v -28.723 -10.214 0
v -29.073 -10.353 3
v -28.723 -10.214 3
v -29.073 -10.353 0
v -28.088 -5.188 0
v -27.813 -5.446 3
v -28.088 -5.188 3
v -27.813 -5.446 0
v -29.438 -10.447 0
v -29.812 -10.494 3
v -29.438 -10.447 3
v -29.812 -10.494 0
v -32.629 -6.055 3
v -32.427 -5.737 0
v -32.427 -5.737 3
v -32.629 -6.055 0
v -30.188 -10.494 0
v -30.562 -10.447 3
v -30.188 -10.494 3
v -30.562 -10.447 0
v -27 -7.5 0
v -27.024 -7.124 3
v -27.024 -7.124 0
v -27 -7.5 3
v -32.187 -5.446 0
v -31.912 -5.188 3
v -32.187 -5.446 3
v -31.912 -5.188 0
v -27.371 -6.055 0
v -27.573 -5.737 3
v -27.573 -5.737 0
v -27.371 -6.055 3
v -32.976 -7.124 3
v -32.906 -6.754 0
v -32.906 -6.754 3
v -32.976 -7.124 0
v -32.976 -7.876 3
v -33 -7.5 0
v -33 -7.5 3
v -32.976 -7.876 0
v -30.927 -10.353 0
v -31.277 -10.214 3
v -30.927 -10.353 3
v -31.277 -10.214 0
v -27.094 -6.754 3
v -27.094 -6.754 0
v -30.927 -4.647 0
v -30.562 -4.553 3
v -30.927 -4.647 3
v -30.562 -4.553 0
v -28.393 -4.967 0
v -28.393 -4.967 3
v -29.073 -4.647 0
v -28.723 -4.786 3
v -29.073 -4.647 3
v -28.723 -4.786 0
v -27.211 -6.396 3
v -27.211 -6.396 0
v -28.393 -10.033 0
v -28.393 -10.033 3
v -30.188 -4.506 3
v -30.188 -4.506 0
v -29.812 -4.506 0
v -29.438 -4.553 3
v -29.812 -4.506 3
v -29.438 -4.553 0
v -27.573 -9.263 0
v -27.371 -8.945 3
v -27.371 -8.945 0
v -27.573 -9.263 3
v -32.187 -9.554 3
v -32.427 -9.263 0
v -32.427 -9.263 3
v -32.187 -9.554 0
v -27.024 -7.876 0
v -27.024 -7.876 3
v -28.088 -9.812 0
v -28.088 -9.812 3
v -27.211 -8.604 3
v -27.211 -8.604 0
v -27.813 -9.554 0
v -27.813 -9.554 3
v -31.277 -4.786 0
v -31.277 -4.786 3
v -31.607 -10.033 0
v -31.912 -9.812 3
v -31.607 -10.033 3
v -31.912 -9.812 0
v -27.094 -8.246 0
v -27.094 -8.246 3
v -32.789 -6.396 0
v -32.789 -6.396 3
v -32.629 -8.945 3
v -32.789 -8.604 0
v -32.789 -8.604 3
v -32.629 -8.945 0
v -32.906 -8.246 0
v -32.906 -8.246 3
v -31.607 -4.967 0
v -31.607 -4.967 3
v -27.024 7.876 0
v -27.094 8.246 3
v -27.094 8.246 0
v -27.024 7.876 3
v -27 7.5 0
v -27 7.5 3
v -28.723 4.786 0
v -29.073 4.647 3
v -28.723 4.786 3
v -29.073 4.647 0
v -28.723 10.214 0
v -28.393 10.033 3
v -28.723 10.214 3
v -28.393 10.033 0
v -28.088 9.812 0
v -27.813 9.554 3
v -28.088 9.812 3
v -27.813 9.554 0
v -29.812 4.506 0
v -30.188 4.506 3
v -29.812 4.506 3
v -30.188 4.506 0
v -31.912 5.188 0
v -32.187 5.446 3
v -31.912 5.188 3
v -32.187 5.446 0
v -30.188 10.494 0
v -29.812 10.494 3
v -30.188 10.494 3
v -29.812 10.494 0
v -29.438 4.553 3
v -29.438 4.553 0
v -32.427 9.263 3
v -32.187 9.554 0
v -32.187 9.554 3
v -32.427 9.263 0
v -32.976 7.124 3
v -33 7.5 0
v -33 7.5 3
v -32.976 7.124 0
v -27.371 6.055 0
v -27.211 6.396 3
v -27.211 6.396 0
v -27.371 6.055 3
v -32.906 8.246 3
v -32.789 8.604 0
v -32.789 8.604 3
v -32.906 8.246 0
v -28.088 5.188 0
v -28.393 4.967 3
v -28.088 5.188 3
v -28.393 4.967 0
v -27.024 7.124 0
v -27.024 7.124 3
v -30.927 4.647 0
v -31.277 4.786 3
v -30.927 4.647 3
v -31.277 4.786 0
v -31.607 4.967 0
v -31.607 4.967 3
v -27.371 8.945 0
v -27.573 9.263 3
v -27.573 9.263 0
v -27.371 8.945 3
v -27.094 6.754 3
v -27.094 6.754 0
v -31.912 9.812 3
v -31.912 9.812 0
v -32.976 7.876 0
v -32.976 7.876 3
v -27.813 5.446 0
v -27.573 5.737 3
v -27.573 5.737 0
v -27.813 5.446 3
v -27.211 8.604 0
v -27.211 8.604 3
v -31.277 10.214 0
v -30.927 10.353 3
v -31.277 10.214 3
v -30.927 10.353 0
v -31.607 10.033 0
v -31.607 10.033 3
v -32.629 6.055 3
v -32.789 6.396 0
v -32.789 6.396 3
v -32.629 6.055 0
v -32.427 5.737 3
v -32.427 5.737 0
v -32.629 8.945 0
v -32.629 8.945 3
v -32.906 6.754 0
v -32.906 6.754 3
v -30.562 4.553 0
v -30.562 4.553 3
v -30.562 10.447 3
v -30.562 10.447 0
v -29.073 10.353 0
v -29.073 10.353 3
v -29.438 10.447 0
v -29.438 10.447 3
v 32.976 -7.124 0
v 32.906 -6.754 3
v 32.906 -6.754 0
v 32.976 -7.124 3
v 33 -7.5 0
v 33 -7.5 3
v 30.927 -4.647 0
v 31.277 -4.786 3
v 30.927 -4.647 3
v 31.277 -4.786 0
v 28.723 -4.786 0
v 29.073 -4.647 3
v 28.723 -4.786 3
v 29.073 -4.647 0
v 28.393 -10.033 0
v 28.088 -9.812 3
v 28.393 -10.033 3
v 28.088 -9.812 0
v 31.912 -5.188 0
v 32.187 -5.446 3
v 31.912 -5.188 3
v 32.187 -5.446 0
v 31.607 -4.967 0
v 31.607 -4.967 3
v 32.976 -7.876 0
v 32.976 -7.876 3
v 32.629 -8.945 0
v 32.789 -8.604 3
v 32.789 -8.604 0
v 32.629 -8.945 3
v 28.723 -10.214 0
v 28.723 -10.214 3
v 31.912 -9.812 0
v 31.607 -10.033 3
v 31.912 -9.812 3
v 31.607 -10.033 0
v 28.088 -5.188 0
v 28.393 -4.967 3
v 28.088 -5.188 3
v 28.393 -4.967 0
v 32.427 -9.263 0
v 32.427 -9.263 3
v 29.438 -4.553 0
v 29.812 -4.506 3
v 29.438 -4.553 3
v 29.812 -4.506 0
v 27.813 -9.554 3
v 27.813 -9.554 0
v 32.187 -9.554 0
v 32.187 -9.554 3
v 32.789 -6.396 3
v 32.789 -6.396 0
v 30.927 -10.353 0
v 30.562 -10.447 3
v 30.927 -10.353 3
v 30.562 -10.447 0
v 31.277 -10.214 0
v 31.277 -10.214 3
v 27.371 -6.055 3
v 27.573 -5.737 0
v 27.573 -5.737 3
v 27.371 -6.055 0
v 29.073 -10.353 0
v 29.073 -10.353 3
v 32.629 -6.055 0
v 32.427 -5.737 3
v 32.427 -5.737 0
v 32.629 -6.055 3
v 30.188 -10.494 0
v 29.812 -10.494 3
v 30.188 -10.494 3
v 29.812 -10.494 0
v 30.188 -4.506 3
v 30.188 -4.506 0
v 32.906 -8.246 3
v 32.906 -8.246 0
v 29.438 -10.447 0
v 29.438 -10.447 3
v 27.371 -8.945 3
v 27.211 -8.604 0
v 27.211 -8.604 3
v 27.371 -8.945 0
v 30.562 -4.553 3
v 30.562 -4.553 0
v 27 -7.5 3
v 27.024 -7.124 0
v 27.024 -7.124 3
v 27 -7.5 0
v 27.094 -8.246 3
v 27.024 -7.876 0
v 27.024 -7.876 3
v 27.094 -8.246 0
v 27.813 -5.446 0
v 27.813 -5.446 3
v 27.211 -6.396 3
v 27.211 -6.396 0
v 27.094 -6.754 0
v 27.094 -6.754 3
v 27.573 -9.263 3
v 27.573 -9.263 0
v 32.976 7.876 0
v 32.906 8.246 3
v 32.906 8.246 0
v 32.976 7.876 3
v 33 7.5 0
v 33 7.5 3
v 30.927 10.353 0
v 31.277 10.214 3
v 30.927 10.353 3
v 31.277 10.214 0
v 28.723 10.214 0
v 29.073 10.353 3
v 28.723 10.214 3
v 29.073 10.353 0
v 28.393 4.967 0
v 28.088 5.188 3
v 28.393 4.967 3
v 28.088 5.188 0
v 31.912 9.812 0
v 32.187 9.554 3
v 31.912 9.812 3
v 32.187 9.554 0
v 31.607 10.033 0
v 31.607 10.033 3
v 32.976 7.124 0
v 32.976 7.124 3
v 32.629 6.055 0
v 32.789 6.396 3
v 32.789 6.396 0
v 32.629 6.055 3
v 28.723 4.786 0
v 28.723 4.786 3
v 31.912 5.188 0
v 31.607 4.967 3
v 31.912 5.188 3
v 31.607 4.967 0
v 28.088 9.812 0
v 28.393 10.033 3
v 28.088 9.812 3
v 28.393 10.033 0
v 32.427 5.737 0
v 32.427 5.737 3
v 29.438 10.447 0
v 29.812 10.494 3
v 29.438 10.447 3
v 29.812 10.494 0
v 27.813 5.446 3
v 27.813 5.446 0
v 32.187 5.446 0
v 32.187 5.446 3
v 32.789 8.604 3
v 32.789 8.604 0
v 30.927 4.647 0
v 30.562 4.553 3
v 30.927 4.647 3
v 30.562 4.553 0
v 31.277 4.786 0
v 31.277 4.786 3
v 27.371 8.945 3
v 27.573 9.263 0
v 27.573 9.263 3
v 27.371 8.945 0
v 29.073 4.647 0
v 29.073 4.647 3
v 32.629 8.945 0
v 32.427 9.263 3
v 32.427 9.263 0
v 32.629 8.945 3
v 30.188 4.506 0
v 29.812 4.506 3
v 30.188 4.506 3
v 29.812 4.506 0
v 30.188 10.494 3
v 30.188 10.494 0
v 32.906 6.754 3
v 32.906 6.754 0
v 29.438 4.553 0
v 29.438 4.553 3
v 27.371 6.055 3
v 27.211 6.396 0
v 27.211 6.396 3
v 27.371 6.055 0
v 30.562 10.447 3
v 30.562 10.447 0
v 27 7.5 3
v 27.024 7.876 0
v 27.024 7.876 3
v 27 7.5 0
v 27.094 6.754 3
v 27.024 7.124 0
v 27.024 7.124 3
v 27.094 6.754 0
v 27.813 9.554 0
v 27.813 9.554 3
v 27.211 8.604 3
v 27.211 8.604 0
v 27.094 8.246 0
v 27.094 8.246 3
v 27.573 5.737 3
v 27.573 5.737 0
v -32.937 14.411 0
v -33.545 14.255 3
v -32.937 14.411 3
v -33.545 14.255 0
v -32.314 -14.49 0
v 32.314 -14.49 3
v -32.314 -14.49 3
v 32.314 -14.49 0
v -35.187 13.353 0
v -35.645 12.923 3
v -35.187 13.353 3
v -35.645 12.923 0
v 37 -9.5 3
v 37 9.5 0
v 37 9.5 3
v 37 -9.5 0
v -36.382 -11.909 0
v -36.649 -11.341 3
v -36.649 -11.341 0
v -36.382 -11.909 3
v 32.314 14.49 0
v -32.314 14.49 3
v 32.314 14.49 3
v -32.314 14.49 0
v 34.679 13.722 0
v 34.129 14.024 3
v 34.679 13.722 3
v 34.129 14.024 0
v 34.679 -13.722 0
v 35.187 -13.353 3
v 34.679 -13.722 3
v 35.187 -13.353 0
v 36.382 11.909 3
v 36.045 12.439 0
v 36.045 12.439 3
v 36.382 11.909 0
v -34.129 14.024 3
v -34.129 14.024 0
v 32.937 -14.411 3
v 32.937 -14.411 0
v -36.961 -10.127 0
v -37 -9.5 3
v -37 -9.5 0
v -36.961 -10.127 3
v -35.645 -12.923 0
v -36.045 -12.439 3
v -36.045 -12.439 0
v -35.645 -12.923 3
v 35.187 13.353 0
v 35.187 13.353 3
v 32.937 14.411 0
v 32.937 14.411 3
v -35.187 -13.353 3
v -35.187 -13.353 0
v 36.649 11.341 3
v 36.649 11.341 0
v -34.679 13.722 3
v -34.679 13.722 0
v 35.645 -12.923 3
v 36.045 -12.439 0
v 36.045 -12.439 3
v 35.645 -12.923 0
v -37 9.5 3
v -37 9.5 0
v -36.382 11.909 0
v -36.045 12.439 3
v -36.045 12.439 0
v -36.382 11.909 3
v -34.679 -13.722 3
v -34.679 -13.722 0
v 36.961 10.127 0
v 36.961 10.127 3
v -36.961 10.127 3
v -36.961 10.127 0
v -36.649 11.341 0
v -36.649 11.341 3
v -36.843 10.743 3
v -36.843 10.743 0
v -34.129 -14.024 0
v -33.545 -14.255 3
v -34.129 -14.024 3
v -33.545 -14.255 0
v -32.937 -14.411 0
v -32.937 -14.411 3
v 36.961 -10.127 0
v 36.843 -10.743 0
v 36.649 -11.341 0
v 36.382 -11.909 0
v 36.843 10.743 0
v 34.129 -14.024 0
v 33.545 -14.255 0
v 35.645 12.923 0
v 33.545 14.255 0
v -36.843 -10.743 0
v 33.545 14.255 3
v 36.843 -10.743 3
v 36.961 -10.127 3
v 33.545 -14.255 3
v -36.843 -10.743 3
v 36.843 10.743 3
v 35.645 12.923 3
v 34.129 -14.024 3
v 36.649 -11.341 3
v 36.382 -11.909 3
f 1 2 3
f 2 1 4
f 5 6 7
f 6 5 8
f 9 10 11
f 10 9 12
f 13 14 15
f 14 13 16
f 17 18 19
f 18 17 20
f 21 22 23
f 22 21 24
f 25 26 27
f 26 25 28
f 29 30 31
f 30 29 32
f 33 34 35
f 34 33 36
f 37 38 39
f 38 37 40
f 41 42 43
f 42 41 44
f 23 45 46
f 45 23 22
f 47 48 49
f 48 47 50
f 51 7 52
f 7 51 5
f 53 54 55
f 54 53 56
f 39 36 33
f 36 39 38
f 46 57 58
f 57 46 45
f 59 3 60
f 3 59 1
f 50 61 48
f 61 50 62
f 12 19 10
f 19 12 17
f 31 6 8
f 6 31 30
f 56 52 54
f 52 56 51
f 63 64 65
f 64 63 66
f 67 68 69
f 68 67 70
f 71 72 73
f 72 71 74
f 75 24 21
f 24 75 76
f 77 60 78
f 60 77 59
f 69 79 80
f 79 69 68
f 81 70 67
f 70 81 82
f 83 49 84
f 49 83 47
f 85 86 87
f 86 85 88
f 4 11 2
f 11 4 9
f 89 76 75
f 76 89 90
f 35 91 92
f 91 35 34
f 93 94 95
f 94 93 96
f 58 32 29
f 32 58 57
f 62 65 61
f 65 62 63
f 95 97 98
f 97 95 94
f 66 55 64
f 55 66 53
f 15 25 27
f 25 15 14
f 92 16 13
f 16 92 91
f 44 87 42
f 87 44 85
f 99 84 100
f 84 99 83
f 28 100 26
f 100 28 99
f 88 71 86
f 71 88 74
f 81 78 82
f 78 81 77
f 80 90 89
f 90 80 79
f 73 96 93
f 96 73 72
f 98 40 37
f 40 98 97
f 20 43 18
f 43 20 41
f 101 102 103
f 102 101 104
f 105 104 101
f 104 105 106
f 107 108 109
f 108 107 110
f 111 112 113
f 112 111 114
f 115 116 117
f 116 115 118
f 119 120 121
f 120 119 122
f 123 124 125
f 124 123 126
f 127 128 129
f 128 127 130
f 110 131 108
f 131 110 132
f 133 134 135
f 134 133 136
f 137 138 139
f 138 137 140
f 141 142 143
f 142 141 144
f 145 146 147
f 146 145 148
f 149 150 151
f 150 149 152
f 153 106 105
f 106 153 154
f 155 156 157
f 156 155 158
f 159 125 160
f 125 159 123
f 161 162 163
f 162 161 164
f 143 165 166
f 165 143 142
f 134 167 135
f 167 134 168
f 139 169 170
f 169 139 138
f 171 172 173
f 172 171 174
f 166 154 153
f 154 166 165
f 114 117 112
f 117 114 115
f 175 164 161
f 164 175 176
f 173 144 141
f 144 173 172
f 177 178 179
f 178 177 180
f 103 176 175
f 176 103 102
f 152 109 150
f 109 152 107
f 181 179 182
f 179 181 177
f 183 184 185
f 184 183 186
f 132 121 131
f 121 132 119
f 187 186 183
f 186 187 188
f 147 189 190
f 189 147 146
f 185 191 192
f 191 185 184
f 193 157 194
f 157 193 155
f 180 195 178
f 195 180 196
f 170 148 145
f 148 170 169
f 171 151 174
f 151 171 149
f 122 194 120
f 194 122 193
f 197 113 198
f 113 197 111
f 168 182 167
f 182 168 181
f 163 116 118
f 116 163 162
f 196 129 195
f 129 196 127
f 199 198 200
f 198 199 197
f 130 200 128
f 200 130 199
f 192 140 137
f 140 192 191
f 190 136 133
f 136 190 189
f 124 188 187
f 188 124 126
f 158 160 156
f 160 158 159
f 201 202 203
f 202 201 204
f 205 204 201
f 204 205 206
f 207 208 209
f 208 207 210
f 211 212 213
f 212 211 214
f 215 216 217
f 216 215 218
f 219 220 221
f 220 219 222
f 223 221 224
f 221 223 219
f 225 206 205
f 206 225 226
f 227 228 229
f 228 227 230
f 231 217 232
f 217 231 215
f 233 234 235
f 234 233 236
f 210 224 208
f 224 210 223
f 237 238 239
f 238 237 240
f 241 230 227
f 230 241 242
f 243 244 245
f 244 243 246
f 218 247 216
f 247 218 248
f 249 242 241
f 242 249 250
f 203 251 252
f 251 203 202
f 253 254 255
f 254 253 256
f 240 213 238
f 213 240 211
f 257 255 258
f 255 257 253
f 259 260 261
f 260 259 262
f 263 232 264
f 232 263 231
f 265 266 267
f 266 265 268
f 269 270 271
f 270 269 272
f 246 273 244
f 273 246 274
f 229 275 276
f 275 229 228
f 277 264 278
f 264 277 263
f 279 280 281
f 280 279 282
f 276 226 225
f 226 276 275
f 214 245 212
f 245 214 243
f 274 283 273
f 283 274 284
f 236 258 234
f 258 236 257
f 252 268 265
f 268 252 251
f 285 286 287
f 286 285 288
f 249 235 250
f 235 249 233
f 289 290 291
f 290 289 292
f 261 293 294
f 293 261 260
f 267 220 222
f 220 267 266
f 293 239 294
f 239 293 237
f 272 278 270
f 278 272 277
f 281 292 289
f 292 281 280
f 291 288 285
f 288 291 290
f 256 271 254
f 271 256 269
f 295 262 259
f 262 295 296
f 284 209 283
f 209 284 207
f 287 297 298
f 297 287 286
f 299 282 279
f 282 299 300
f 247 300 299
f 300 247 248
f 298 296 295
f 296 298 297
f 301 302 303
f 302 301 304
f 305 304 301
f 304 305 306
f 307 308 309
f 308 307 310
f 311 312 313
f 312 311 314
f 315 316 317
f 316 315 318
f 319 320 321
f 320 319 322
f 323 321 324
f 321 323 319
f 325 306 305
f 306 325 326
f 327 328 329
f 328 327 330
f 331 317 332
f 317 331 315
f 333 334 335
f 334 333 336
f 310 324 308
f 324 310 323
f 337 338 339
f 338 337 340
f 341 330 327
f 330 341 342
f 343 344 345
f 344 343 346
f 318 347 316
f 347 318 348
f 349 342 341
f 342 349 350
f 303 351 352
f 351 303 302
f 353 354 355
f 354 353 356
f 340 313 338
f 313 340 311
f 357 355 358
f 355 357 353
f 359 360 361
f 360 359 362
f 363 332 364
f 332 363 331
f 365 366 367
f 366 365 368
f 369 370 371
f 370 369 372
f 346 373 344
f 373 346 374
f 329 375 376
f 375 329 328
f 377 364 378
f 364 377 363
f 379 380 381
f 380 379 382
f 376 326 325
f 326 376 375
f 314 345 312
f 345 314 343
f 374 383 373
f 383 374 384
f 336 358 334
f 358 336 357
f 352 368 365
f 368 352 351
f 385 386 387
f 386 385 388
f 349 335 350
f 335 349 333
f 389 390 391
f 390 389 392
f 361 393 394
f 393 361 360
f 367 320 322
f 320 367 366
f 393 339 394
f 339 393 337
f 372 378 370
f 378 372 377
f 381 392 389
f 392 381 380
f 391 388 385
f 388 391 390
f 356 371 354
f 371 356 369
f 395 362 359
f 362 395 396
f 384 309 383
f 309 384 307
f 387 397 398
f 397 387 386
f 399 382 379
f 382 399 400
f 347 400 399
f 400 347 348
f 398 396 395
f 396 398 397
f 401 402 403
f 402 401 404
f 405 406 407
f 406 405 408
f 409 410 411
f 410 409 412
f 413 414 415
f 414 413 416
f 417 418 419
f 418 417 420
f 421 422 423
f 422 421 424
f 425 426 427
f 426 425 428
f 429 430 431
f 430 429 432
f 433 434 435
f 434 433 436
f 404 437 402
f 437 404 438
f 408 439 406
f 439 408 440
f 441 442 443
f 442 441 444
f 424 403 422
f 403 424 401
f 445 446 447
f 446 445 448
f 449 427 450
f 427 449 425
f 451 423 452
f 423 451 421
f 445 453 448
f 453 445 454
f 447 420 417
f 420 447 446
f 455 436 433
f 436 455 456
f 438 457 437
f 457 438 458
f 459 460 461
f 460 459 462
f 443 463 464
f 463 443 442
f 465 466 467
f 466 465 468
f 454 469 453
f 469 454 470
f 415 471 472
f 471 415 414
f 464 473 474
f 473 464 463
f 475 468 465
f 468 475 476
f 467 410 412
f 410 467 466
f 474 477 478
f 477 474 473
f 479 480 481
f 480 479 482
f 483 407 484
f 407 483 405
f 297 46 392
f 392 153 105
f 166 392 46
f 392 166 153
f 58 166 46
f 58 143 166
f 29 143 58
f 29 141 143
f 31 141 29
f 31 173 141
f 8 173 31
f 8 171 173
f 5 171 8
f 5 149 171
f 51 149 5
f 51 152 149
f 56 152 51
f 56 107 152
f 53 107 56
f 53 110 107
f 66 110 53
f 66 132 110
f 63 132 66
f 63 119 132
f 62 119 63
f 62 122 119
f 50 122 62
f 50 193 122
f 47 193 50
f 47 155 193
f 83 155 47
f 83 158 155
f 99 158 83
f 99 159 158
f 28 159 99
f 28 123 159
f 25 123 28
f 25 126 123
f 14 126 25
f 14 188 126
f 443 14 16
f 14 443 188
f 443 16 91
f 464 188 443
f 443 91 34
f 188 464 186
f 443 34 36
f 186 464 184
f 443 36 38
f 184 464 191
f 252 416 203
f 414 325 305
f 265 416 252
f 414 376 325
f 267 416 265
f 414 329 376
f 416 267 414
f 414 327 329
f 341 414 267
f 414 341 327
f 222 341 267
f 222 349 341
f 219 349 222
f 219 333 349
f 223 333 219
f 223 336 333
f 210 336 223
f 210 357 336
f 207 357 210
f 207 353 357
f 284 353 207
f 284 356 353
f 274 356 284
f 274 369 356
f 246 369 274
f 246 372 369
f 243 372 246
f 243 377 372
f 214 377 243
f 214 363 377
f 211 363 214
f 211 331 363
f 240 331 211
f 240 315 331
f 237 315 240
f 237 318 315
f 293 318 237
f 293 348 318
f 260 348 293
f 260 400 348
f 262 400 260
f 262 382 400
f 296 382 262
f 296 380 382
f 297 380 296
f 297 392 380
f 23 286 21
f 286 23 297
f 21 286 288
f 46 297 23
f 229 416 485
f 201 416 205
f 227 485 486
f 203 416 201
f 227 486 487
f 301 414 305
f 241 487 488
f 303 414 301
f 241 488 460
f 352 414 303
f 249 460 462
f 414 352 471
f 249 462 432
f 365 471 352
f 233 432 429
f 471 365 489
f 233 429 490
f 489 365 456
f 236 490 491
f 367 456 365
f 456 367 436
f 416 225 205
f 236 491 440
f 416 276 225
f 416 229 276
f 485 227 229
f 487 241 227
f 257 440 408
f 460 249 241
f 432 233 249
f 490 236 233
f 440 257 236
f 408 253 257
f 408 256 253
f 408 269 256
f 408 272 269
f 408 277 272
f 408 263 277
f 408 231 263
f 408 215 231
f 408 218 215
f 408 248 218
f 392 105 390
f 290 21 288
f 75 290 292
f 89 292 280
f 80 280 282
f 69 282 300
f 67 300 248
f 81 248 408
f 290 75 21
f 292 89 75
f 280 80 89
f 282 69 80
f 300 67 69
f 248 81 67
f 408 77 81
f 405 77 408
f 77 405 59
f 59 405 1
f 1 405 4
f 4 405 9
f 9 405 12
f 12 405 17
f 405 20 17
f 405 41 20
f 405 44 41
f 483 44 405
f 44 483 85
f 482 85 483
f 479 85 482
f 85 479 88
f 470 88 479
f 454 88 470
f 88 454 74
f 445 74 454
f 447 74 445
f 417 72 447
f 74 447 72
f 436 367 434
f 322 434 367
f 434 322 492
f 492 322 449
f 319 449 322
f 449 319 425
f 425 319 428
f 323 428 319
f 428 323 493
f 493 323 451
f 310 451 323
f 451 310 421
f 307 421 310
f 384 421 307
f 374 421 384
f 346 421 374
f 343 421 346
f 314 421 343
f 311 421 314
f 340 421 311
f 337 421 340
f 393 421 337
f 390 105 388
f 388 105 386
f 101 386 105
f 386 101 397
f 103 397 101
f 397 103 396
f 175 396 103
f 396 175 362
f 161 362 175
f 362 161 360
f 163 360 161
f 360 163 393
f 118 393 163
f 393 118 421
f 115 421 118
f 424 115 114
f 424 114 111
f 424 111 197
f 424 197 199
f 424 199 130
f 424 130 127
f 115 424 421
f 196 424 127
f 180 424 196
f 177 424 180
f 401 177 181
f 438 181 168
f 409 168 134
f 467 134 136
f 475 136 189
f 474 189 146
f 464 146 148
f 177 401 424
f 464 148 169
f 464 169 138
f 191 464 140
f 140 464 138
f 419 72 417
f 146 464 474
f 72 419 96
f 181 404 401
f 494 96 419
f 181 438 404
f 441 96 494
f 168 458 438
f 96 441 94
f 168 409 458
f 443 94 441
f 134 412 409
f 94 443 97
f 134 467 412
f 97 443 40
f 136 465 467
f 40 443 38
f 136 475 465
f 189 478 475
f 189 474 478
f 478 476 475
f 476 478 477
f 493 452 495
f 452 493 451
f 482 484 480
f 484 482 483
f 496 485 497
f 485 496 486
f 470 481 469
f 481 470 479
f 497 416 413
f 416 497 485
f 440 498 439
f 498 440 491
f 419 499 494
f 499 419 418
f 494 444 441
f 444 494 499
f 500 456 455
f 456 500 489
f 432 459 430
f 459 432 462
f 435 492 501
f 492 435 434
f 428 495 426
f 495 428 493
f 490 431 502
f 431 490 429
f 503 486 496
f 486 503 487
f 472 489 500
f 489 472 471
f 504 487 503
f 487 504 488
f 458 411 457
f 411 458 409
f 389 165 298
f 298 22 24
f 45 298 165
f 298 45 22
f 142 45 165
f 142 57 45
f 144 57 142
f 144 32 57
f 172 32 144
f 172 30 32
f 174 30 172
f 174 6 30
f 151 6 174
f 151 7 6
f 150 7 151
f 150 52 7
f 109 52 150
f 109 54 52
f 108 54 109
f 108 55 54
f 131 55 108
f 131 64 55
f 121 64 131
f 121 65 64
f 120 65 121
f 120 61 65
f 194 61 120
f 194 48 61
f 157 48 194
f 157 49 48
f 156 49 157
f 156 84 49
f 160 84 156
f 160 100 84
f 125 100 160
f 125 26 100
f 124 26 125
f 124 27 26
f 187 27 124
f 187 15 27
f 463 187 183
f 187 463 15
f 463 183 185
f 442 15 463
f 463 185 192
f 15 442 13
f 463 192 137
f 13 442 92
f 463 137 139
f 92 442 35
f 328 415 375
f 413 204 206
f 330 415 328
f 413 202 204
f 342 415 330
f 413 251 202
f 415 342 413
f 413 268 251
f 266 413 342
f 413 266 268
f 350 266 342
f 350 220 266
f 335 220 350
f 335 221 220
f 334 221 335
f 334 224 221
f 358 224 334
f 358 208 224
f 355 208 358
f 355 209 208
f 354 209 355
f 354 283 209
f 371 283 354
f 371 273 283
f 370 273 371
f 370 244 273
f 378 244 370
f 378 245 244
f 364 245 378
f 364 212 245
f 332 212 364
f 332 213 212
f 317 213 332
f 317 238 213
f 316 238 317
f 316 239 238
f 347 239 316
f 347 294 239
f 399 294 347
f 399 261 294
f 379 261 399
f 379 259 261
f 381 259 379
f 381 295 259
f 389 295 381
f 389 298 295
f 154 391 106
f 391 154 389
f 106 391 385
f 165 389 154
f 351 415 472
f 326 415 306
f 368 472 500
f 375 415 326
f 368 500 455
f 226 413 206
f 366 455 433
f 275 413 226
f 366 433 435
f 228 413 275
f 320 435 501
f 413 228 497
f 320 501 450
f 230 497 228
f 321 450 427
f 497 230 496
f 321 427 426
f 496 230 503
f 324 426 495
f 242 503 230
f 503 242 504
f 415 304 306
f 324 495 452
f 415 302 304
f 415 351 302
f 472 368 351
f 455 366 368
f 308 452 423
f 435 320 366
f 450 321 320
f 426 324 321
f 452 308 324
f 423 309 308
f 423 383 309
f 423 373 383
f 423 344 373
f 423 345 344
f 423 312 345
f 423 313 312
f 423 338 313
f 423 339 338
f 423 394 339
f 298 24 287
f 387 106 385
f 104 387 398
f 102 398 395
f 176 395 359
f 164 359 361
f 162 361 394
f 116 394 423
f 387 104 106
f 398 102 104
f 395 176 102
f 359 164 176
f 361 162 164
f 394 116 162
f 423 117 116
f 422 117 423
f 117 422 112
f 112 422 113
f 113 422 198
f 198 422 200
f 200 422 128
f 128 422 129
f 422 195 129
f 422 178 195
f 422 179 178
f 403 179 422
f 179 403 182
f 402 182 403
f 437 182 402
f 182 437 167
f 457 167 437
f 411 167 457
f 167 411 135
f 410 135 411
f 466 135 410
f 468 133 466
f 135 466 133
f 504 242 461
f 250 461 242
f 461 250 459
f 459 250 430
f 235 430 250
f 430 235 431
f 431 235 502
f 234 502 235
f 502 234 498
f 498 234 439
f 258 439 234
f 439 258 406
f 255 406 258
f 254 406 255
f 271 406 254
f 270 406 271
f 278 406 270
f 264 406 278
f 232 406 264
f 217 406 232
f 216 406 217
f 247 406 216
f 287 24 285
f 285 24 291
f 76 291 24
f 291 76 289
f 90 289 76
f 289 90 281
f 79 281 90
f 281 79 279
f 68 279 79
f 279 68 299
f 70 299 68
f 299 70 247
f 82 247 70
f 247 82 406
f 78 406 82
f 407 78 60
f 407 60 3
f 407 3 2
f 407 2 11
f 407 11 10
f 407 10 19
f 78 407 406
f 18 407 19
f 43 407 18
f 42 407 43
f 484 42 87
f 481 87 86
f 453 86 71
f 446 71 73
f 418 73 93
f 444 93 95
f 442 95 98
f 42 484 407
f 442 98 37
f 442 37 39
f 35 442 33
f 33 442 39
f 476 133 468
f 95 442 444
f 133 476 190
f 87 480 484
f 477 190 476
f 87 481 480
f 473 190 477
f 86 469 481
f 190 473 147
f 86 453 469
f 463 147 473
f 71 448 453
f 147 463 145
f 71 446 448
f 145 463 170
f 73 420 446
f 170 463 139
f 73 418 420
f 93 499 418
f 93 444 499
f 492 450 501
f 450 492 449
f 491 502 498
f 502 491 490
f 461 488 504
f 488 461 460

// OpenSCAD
$fn = 50;


difference() {
	union() {
		hull() {
			translate(v = [-32.0000000000, 9.5000000000, 0]) {
				cylinder(h = 3, r = 5);
			}
			translate(v = [32.0000000000, 9.5000000000, 0]) {
				cylinder(h = 3, r = 5);
			}
			translate(v = [-32.0000000000, -9.5000000000, 0]) {
				cylinder(h = 3, r = 5);
			}
			translate(v = [32.0000000000, -9.5000000000, 0]) {
				cylinder(h = 3, r = 5);
			}
		}
	}
	union() {
		translate(v = [-30.0000000000, -7.5000000000, -100.0000000000]) {
			cylinder(h = 200, r = 3.0000000000);
		}
		translate(v = [-30.0000000000, 7.5000000000, -100.0000000000]) {
			cylinder(h = 200, r = 3.0000000000);
		}
		translate(v = [30.0000000000, -7.5000000000, -100.0000000000]) {
			cylinder(h = 200, r = 3.0000000000);
		}
		translate(v = [30.0000000000, 7.5000000000, -100.0000000000]) {
			cylinder(h = 200, r = 3.0000000000);
		}
	}
}
